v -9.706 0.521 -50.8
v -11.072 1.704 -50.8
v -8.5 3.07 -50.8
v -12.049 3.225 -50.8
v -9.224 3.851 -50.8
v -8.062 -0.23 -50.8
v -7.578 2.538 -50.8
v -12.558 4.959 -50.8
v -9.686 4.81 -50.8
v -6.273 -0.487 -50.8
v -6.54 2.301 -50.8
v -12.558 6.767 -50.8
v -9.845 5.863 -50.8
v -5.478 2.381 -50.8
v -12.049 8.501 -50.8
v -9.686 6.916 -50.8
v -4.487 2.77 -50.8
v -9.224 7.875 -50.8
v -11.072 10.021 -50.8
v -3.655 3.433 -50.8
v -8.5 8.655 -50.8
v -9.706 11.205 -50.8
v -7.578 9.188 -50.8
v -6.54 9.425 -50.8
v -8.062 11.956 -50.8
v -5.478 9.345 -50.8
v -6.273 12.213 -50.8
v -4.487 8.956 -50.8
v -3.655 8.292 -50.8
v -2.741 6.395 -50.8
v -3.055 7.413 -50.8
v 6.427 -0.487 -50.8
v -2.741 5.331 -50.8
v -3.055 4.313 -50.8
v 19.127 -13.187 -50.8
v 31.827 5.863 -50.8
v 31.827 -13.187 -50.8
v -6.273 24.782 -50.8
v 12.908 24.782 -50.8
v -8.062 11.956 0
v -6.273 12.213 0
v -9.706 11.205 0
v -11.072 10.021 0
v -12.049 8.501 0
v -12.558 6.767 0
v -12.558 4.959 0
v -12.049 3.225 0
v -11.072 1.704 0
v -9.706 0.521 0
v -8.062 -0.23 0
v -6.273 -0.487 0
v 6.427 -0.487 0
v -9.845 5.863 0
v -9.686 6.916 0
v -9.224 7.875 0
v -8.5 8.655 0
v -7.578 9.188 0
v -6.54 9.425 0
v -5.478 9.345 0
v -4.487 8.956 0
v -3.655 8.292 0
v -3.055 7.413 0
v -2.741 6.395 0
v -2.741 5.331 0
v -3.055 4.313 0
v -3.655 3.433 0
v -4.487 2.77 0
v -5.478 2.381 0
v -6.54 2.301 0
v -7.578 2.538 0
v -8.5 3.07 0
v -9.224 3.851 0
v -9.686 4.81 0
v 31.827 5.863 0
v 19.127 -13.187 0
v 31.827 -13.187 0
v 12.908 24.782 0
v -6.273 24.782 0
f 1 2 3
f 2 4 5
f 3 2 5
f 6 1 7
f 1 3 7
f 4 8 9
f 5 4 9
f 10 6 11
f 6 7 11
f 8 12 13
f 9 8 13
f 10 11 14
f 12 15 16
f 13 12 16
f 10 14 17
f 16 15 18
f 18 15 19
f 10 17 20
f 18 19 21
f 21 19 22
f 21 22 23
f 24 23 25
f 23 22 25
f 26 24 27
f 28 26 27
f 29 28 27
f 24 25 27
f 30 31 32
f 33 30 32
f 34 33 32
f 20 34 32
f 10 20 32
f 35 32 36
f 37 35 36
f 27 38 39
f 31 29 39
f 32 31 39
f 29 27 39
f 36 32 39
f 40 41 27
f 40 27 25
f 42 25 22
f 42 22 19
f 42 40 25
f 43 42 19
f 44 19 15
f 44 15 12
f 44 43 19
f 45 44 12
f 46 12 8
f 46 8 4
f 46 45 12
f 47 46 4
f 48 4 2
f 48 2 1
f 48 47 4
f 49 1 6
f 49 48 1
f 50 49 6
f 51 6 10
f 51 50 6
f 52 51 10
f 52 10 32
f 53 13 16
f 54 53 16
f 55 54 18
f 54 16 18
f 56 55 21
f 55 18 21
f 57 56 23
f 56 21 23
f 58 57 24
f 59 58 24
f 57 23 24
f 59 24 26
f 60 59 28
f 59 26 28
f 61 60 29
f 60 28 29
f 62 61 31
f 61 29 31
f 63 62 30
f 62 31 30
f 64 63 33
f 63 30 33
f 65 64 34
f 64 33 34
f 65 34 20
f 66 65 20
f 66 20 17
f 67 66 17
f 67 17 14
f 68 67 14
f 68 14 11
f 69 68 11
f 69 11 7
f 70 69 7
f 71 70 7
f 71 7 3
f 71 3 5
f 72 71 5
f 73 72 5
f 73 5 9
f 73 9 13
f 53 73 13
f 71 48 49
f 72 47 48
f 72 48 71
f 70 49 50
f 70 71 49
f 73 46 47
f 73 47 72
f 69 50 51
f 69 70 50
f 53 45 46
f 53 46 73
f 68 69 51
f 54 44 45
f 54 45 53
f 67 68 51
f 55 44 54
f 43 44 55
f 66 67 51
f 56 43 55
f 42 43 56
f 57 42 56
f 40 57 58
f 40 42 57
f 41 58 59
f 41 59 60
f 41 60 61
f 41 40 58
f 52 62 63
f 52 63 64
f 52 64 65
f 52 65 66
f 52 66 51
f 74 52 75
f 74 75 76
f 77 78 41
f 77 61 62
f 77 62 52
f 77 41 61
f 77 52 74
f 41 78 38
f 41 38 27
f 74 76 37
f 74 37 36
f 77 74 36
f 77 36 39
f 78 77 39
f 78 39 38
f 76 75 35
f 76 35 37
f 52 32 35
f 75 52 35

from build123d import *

# Parameters (mm, degrees)
BOSS_EXTRUDE1_DEPTH             = 50.8
F_9_32_0_28125_DIAMETER_HOLE1_D = 7.14375


with BuildPart() as part:
    # Sketch1 → Boss-Extrude1 (new body)
    with BuildSketch(Plane.XY):
        with BuildLine():
            ThreePointArc((0.076969069, 5.862862723), (-1.78290287, 1.372734663), (-6.273030931, -0.487137277))
            Line((-6.273030931, -0.487137277), (6.426969069, -0.487137277))
            Line((6.426969069, -0.487137277), (19.126969069, -13.187137277))
            Line((19.126969069, -13.187137277), (31.826969069, -13.187137277))
            Line((31.826969069, -13.187137277), (31.826969069, 5.862862723))
            Line((31.826969069, 5.862862723), (12.908151542, 24.781680251))
            Line((12.908151542, 24.781680251), (-6.273030931, 24.781680251))
            Line((-6.273030931, 24.781680251), (-6.273030931, 12.212862723))
            ThreePointArc((-6.273030931, 12.212862723), (-1.78290287, 10.352990784), (0.076969069, 5.862862723))
        make_face()
        with BuildLine():
            ThreePointArc((-6.273030931, 12.212862723), (-12.623030931, 5.862862723), (-6.273030931, -0.487137277))
            Line((-6.273030931, -0.487137277), (-6.273030931, 12.212862723))
        make_face()
        with BuildLine():
            Line((-6.273030931, 12.212862723), (-6.273030931, -0.487137277))
            ThreePointArc((-6.273030931, -0.487137277), (-1.78290287, 1.372734663), (0.076969069, 5.862862723))
            ThreePointArc((0.076969069, 5.862862723), (-1.78290287, 10.352990784), (-6.273030931, 12.212862723))
        make_face()
    extrude(amount=-BOSS_EXTRUDE1_DEPTH)

    # 9/32 (0.28125) Diameter Hole1 (through all)
    with Locations(Plane(origin=(-6.273030931, 5.862862723, 0), x_dir=(1, 0, 0), z_dir=(0, 0, 1))):
        with Locations((0, 0)):
            Hole(F_9_32_0_28125_DIAMETER_HOLE1_D / 2)


solid = part.part
